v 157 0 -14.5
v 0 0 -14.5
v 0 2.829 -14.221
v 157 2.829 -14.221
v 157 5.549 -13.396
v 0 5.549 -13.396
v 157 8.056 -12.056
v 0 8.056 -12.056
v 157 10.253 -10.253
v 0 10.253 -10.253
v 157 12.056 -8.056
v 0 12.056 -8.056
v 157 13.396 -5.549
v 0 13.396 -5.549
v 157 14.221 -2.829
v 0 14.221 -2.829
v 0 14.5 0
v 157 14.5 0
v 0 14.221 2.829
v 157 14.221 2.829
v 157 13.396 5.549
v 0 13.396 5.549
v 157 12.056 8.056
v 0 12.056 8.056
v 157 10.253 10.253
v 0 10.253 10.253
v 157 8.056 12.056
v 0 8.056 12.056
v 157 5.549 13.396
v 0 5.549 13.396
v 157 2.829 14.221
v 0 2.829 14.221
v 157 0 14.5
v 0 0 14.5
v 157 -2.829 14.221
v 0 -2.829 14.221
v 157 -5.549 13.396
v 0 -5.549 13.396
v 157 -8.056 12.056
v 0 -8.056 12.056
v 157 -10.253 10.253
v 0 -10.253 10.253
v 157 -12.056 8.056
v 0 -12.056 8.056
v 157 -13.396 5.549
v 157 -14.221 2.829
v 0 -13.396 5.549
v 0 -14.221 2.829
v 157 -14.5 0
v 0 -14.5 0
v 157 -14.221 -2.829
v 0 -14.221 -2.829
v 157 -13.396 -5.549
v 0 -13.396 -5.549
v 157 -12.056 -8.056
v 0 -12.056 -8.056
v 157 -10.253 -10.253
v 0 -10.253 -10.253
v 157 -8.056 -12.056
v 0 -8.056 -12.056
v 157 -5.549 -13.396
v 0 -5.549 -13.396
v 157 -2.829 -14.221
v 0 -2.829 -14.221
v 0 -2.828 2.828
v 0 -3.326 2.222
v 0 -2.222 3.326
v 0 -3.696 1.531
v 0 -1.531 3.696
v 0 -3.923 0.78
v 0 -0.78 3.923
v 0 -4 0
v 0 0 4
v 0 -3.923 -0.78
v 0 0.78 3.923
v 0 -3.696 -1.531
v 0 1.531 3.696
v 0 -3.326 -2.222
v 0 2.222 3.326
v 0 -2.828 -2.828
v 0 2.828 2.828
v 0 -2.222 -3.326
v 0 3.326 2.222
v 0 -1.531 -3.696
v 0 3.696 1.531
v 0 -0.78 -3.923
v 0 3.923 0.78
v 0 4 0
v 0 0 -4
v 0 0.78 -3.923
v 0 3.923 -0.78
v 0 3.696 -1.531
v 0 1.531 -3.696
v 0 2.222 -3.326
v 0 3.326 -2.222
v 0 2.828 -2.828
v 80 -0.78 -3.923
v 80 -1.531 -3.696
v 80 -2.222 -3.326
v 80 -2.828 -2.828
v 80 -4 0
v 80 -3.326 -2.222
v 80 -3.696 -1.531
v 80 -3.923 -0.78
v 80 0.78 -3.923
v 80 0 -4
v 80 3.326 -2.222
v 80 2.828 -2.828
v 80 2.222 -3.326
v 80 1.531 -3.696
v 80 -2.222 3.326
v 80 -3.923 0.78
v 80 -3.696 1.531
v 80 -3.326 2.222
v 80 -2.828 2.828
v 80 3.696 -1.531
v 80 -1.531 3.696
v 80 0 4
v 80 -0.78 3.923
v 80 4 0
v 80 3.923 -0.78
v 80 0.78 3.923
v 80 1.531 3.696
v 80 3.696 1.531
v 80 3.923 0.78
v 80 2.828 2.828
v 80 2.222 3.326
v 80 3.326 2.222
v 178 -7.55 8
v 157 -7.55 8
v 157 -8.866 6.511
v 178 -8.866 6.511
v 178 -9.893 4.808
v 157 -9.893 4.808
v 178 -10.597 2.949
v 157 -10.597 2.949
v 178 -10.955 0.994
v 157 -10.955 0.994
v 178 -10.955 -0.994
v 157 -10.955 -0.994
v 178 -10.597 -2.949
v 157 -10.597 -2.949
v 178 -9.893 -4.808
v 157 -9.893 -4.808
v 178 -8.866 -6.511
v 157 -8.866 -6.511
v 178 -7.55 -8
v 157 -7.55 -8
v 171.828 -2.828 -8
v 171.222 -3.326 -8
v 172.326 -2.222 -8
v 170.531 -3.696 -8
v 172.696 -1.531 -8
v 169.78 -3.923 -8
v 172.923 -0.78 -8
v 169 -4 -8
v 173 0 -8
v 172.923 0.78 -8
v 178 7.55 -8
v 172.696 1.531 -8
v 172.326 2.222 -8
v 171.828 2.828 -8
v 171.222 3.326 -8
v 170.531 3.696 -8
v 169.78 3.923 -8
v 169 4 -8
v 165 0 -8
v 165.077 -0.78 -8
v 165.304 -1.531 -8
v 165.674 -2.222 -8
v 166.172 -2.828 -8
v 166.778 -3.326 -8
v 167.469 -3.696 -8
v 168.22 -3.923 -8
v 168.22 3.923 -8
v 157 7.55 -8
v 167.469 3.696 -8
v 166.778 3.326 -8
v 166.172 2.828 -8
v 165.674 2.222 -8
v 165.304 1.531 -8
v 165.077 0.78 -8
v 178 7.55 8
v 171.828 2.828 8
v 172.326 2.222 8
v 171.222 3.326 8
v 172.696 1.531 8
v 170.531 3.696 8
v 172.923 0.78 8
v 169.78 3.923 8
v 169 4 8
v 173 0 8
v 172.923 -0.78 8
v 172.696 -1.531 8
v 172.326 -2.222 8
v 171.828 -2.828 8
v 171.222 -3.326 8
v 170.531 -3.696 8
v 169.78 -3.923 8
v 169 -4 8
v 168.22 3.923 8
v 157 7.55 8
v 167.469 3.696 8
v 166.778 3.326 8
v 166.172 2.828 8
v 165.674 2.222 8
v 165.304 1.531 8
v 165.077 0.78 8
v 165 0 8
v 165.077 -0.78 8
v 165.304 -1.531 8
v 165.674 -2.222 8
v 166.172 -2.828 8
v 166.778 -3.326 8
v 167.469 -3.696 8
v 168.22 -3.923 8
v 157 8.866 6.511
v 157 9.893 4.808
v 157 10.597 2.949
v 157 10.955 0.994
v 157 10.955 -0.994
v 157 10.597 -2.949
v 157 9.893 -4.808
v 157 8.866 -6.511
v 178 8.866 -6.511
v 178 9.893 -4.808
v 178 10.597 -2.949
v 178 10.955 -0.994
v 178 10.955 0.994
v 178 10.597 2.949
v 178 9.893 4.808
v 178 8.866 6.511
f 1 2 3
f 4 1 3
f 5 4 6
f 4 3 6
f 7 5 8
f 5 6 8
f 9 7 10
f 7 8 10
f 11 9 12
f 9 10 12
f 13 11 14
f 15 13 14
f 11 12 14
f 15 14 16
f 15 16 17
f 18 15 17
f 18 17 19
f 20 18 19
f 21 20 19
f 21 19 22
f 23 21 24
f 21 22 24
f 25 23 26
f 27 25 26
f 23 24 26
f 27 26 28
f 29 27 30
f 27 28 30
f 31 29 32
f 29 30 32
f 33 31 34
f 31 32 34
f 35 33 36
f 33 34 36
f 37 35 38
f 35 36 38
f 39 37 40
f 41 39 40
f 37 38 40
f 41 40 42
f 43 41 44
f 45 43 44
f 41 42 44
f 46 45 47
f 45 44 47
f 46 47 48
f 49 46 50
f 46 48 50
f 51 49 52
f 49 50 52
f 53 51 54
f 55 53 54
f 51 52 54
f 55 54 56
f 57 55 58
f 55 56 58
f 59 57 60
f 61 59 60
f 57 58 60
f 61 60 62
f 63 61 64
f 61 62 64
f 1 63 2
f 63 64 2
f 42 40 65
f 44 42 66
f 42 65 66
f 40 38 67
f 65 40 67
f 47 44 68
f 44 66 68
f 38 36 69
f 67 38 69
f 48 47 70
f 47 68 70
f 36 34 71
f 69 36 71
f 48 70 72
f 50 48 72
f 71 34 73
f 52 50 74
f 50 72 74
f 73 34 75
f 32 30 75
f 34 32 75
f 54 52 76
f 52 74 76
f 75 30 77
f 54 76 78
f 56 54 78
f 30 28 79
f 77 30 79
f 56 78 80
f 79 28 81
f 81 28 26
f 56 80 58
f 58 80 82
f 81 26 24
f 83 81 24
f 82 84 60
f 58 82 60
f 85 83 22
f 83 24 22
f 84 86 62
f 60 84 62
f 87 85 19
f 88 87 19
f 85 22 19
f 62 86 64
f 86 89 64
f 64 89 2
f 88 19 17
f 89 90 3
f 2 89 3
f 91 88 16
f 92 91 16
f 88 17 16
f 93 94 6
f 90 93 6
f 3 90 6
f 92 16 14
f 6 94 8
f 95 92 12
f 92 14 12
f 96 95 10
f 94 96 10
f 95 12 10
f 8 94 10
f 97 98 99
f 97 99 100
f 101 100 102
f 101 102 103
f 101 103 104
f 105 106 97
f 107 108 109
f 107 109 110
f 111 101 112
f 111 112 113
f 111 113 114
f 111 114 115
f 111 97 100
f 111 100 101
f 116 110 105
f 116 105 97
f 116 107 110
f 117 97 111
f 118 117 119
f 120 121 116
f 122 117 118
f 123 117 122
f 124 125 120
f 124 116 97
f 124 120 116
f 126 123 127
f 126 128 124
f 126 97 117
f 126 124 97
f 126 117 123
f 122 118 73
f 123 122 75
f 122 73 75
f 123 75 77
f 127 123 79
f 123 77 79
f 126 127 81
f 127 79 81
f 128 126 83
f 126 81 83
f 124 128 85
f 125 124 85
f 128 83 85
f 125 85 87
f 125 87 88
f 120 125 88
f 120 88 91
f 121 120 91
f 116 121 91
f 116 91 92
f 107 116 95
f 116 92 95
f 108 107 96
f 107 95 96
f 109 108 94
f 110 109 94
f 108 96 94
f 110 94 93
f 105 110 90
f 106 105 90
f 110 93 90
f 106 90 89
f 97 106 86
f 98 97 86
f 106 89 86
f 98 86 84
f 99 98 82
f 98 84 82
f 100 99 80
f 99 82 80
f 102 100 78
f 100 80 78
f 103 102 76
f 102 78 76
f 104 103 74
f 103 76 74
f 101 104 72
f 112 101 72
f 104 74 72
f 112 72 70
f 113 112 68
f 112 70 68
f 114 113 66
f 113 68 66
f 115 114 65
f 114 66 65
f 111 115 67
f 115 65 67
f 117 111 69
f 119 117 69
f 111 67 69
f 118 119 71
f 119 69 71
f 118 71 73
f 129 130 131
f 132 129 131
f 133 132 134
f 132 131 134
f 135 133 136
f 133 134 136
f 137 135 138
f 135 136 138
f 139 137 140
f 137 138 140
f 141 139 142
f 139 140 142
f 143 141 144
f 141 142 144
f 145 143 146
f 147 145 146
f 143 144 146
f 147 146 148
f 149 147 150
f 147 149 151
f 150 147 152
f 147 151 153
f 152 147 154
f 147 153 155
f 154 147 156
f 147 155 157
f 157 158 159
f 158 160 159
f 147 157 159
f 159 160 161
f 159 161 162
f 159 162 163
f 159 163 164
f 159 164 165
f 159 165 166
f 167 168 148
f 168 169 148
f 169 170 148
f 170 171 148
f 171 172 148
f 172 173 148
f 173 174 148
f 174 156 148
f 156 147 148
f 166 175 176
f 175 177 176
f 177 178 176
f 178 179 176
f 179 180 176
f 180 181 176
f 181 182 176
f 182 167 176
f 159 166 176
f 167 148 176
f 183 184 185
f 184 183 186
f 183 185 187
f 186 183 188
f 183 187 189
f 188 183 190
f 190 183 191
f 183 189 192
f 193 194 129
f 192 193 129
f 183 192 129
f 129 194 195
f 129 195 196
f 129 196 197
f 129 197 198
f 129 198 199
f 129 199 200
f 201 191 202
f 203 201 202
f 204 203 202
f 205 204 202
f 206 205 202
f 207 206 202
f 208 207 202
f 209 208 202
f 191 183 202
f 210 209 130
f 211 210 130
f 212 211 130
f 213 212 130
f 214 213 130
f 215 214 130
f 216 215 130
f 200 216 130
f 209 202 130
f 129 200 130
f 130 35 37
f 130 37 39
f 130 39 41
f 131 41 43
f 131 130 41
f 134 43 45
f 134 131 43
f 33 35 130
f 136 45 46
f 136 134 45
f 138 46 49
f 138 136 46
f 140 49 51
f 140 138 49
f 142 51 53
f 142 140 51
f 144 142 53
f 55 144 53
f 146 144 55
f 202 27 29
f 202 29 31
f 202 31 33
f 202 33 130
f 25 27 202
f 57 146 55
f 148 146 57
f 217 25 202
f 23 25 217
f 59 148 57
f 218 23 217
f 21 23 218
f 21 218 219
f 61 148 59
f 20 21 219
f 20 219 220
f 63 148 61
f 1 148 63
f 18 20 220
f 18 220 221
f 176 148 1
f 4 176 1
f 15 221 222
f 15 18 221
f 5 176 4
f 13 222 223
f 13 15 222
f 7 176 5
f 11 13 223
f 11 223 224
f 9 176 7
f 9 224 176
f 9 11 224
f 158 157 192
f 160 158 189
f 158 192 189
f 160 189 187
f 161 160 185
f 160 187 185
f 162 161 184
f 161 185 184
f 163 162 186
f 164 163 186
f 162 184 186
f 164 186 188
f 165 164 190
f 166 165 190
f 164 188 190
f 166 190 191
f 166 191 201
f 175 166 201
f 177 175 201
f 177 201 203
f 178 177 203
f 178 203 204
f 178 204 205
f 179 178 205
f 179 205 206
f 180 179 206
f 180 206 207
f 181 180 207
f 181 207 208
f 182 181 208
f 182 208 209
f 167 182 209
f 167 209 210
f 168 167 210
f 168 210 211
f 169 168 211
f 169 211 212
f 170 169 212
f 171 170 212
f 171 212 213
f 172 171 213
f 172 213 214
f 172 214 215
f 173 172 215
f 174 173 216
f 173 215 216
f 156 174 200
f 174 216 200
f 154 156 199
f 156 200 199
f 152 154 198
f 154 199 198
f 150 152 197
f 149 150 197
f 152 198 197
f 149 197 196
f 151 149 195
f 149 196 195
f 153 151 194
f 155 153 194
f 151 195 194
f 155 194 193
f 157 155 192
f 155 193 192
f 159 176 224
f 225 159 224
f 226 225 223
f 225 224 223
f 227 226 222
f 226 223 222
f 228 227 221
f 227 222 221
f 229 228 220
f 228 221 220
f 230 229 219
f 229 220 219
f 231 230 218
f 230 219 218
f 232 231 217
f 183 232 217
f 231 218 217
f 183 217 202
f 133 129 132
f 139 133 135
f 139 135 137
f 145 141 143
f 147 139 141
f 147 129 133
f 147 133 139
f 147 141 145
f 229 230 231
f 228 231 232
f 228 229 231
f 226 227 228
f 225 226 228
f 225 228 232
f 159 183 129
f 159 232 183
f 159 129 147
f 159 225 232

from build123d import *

# Parameters (mm, degrees)
SKETCH_1_R          = 14.5
EXTRUDE_1_DEPTH     = 157
EXTRUDE_2_DEPTH     = 21
SKETCH_3_R          = 4
CUT_EXTRUDE_1_DEPTH = 21
SKETCH_4_R          = 4
CUT_EXTRUDE_2_DEPTH = 80


with BuildPart() as part:
    # 草图1 → 凸台-拉伸1 (new body)
    with BuildSketch(Plane(origin=(0, 0, 0), x_dir=(0, 0, -1), z_dir=(1, 0, 0))):
        Circle(SKETCH_1_R)
    extrude(amount=EXTRUDE_1_DEPTH)

    # 草图2 → 凸台-拉伸2 (add)
    with BuildSketch(Plane(origin=(157, 0, 0), x_dir=(0, 0, -1), z_dir=(1, 0, 0))):
        with BuildLine():
            Line((-8, 7.549834435), (-8, -7.549834435))
            ThreePointArc((-8, -7.549834435), (0, -11), (8, -7.549834435))
            Line((8, -7.549834435), (8, 7.549834435))
            ThreePointArc((8, 7.549834435), (0, 11), (-8, 7.549834435))
        make_face()
    extrude(amount=EXTRUDE_2_DEPTH)

    # 草图3 → 切除-拉伸1 (cut)
    with BuildSketch(Plane.XY.offset(8)):
        with Locations((169, 0)):
            Circle(SKETCH_3_R)
    extrude(amount=-CUT_EXTRUDE_1_DEPTH, mode=Mode.SUBTRACT)

    # 草图4 → 切除-拉伸2 (cut)
    with BuildSketch(Plane.ZY):
        Circle(SKETCH_4_R)
    extrude(amount=-CUT_EXTRUDE_2_DEPTH, mode=Mode.SUBTRACT)


solid = part.part
